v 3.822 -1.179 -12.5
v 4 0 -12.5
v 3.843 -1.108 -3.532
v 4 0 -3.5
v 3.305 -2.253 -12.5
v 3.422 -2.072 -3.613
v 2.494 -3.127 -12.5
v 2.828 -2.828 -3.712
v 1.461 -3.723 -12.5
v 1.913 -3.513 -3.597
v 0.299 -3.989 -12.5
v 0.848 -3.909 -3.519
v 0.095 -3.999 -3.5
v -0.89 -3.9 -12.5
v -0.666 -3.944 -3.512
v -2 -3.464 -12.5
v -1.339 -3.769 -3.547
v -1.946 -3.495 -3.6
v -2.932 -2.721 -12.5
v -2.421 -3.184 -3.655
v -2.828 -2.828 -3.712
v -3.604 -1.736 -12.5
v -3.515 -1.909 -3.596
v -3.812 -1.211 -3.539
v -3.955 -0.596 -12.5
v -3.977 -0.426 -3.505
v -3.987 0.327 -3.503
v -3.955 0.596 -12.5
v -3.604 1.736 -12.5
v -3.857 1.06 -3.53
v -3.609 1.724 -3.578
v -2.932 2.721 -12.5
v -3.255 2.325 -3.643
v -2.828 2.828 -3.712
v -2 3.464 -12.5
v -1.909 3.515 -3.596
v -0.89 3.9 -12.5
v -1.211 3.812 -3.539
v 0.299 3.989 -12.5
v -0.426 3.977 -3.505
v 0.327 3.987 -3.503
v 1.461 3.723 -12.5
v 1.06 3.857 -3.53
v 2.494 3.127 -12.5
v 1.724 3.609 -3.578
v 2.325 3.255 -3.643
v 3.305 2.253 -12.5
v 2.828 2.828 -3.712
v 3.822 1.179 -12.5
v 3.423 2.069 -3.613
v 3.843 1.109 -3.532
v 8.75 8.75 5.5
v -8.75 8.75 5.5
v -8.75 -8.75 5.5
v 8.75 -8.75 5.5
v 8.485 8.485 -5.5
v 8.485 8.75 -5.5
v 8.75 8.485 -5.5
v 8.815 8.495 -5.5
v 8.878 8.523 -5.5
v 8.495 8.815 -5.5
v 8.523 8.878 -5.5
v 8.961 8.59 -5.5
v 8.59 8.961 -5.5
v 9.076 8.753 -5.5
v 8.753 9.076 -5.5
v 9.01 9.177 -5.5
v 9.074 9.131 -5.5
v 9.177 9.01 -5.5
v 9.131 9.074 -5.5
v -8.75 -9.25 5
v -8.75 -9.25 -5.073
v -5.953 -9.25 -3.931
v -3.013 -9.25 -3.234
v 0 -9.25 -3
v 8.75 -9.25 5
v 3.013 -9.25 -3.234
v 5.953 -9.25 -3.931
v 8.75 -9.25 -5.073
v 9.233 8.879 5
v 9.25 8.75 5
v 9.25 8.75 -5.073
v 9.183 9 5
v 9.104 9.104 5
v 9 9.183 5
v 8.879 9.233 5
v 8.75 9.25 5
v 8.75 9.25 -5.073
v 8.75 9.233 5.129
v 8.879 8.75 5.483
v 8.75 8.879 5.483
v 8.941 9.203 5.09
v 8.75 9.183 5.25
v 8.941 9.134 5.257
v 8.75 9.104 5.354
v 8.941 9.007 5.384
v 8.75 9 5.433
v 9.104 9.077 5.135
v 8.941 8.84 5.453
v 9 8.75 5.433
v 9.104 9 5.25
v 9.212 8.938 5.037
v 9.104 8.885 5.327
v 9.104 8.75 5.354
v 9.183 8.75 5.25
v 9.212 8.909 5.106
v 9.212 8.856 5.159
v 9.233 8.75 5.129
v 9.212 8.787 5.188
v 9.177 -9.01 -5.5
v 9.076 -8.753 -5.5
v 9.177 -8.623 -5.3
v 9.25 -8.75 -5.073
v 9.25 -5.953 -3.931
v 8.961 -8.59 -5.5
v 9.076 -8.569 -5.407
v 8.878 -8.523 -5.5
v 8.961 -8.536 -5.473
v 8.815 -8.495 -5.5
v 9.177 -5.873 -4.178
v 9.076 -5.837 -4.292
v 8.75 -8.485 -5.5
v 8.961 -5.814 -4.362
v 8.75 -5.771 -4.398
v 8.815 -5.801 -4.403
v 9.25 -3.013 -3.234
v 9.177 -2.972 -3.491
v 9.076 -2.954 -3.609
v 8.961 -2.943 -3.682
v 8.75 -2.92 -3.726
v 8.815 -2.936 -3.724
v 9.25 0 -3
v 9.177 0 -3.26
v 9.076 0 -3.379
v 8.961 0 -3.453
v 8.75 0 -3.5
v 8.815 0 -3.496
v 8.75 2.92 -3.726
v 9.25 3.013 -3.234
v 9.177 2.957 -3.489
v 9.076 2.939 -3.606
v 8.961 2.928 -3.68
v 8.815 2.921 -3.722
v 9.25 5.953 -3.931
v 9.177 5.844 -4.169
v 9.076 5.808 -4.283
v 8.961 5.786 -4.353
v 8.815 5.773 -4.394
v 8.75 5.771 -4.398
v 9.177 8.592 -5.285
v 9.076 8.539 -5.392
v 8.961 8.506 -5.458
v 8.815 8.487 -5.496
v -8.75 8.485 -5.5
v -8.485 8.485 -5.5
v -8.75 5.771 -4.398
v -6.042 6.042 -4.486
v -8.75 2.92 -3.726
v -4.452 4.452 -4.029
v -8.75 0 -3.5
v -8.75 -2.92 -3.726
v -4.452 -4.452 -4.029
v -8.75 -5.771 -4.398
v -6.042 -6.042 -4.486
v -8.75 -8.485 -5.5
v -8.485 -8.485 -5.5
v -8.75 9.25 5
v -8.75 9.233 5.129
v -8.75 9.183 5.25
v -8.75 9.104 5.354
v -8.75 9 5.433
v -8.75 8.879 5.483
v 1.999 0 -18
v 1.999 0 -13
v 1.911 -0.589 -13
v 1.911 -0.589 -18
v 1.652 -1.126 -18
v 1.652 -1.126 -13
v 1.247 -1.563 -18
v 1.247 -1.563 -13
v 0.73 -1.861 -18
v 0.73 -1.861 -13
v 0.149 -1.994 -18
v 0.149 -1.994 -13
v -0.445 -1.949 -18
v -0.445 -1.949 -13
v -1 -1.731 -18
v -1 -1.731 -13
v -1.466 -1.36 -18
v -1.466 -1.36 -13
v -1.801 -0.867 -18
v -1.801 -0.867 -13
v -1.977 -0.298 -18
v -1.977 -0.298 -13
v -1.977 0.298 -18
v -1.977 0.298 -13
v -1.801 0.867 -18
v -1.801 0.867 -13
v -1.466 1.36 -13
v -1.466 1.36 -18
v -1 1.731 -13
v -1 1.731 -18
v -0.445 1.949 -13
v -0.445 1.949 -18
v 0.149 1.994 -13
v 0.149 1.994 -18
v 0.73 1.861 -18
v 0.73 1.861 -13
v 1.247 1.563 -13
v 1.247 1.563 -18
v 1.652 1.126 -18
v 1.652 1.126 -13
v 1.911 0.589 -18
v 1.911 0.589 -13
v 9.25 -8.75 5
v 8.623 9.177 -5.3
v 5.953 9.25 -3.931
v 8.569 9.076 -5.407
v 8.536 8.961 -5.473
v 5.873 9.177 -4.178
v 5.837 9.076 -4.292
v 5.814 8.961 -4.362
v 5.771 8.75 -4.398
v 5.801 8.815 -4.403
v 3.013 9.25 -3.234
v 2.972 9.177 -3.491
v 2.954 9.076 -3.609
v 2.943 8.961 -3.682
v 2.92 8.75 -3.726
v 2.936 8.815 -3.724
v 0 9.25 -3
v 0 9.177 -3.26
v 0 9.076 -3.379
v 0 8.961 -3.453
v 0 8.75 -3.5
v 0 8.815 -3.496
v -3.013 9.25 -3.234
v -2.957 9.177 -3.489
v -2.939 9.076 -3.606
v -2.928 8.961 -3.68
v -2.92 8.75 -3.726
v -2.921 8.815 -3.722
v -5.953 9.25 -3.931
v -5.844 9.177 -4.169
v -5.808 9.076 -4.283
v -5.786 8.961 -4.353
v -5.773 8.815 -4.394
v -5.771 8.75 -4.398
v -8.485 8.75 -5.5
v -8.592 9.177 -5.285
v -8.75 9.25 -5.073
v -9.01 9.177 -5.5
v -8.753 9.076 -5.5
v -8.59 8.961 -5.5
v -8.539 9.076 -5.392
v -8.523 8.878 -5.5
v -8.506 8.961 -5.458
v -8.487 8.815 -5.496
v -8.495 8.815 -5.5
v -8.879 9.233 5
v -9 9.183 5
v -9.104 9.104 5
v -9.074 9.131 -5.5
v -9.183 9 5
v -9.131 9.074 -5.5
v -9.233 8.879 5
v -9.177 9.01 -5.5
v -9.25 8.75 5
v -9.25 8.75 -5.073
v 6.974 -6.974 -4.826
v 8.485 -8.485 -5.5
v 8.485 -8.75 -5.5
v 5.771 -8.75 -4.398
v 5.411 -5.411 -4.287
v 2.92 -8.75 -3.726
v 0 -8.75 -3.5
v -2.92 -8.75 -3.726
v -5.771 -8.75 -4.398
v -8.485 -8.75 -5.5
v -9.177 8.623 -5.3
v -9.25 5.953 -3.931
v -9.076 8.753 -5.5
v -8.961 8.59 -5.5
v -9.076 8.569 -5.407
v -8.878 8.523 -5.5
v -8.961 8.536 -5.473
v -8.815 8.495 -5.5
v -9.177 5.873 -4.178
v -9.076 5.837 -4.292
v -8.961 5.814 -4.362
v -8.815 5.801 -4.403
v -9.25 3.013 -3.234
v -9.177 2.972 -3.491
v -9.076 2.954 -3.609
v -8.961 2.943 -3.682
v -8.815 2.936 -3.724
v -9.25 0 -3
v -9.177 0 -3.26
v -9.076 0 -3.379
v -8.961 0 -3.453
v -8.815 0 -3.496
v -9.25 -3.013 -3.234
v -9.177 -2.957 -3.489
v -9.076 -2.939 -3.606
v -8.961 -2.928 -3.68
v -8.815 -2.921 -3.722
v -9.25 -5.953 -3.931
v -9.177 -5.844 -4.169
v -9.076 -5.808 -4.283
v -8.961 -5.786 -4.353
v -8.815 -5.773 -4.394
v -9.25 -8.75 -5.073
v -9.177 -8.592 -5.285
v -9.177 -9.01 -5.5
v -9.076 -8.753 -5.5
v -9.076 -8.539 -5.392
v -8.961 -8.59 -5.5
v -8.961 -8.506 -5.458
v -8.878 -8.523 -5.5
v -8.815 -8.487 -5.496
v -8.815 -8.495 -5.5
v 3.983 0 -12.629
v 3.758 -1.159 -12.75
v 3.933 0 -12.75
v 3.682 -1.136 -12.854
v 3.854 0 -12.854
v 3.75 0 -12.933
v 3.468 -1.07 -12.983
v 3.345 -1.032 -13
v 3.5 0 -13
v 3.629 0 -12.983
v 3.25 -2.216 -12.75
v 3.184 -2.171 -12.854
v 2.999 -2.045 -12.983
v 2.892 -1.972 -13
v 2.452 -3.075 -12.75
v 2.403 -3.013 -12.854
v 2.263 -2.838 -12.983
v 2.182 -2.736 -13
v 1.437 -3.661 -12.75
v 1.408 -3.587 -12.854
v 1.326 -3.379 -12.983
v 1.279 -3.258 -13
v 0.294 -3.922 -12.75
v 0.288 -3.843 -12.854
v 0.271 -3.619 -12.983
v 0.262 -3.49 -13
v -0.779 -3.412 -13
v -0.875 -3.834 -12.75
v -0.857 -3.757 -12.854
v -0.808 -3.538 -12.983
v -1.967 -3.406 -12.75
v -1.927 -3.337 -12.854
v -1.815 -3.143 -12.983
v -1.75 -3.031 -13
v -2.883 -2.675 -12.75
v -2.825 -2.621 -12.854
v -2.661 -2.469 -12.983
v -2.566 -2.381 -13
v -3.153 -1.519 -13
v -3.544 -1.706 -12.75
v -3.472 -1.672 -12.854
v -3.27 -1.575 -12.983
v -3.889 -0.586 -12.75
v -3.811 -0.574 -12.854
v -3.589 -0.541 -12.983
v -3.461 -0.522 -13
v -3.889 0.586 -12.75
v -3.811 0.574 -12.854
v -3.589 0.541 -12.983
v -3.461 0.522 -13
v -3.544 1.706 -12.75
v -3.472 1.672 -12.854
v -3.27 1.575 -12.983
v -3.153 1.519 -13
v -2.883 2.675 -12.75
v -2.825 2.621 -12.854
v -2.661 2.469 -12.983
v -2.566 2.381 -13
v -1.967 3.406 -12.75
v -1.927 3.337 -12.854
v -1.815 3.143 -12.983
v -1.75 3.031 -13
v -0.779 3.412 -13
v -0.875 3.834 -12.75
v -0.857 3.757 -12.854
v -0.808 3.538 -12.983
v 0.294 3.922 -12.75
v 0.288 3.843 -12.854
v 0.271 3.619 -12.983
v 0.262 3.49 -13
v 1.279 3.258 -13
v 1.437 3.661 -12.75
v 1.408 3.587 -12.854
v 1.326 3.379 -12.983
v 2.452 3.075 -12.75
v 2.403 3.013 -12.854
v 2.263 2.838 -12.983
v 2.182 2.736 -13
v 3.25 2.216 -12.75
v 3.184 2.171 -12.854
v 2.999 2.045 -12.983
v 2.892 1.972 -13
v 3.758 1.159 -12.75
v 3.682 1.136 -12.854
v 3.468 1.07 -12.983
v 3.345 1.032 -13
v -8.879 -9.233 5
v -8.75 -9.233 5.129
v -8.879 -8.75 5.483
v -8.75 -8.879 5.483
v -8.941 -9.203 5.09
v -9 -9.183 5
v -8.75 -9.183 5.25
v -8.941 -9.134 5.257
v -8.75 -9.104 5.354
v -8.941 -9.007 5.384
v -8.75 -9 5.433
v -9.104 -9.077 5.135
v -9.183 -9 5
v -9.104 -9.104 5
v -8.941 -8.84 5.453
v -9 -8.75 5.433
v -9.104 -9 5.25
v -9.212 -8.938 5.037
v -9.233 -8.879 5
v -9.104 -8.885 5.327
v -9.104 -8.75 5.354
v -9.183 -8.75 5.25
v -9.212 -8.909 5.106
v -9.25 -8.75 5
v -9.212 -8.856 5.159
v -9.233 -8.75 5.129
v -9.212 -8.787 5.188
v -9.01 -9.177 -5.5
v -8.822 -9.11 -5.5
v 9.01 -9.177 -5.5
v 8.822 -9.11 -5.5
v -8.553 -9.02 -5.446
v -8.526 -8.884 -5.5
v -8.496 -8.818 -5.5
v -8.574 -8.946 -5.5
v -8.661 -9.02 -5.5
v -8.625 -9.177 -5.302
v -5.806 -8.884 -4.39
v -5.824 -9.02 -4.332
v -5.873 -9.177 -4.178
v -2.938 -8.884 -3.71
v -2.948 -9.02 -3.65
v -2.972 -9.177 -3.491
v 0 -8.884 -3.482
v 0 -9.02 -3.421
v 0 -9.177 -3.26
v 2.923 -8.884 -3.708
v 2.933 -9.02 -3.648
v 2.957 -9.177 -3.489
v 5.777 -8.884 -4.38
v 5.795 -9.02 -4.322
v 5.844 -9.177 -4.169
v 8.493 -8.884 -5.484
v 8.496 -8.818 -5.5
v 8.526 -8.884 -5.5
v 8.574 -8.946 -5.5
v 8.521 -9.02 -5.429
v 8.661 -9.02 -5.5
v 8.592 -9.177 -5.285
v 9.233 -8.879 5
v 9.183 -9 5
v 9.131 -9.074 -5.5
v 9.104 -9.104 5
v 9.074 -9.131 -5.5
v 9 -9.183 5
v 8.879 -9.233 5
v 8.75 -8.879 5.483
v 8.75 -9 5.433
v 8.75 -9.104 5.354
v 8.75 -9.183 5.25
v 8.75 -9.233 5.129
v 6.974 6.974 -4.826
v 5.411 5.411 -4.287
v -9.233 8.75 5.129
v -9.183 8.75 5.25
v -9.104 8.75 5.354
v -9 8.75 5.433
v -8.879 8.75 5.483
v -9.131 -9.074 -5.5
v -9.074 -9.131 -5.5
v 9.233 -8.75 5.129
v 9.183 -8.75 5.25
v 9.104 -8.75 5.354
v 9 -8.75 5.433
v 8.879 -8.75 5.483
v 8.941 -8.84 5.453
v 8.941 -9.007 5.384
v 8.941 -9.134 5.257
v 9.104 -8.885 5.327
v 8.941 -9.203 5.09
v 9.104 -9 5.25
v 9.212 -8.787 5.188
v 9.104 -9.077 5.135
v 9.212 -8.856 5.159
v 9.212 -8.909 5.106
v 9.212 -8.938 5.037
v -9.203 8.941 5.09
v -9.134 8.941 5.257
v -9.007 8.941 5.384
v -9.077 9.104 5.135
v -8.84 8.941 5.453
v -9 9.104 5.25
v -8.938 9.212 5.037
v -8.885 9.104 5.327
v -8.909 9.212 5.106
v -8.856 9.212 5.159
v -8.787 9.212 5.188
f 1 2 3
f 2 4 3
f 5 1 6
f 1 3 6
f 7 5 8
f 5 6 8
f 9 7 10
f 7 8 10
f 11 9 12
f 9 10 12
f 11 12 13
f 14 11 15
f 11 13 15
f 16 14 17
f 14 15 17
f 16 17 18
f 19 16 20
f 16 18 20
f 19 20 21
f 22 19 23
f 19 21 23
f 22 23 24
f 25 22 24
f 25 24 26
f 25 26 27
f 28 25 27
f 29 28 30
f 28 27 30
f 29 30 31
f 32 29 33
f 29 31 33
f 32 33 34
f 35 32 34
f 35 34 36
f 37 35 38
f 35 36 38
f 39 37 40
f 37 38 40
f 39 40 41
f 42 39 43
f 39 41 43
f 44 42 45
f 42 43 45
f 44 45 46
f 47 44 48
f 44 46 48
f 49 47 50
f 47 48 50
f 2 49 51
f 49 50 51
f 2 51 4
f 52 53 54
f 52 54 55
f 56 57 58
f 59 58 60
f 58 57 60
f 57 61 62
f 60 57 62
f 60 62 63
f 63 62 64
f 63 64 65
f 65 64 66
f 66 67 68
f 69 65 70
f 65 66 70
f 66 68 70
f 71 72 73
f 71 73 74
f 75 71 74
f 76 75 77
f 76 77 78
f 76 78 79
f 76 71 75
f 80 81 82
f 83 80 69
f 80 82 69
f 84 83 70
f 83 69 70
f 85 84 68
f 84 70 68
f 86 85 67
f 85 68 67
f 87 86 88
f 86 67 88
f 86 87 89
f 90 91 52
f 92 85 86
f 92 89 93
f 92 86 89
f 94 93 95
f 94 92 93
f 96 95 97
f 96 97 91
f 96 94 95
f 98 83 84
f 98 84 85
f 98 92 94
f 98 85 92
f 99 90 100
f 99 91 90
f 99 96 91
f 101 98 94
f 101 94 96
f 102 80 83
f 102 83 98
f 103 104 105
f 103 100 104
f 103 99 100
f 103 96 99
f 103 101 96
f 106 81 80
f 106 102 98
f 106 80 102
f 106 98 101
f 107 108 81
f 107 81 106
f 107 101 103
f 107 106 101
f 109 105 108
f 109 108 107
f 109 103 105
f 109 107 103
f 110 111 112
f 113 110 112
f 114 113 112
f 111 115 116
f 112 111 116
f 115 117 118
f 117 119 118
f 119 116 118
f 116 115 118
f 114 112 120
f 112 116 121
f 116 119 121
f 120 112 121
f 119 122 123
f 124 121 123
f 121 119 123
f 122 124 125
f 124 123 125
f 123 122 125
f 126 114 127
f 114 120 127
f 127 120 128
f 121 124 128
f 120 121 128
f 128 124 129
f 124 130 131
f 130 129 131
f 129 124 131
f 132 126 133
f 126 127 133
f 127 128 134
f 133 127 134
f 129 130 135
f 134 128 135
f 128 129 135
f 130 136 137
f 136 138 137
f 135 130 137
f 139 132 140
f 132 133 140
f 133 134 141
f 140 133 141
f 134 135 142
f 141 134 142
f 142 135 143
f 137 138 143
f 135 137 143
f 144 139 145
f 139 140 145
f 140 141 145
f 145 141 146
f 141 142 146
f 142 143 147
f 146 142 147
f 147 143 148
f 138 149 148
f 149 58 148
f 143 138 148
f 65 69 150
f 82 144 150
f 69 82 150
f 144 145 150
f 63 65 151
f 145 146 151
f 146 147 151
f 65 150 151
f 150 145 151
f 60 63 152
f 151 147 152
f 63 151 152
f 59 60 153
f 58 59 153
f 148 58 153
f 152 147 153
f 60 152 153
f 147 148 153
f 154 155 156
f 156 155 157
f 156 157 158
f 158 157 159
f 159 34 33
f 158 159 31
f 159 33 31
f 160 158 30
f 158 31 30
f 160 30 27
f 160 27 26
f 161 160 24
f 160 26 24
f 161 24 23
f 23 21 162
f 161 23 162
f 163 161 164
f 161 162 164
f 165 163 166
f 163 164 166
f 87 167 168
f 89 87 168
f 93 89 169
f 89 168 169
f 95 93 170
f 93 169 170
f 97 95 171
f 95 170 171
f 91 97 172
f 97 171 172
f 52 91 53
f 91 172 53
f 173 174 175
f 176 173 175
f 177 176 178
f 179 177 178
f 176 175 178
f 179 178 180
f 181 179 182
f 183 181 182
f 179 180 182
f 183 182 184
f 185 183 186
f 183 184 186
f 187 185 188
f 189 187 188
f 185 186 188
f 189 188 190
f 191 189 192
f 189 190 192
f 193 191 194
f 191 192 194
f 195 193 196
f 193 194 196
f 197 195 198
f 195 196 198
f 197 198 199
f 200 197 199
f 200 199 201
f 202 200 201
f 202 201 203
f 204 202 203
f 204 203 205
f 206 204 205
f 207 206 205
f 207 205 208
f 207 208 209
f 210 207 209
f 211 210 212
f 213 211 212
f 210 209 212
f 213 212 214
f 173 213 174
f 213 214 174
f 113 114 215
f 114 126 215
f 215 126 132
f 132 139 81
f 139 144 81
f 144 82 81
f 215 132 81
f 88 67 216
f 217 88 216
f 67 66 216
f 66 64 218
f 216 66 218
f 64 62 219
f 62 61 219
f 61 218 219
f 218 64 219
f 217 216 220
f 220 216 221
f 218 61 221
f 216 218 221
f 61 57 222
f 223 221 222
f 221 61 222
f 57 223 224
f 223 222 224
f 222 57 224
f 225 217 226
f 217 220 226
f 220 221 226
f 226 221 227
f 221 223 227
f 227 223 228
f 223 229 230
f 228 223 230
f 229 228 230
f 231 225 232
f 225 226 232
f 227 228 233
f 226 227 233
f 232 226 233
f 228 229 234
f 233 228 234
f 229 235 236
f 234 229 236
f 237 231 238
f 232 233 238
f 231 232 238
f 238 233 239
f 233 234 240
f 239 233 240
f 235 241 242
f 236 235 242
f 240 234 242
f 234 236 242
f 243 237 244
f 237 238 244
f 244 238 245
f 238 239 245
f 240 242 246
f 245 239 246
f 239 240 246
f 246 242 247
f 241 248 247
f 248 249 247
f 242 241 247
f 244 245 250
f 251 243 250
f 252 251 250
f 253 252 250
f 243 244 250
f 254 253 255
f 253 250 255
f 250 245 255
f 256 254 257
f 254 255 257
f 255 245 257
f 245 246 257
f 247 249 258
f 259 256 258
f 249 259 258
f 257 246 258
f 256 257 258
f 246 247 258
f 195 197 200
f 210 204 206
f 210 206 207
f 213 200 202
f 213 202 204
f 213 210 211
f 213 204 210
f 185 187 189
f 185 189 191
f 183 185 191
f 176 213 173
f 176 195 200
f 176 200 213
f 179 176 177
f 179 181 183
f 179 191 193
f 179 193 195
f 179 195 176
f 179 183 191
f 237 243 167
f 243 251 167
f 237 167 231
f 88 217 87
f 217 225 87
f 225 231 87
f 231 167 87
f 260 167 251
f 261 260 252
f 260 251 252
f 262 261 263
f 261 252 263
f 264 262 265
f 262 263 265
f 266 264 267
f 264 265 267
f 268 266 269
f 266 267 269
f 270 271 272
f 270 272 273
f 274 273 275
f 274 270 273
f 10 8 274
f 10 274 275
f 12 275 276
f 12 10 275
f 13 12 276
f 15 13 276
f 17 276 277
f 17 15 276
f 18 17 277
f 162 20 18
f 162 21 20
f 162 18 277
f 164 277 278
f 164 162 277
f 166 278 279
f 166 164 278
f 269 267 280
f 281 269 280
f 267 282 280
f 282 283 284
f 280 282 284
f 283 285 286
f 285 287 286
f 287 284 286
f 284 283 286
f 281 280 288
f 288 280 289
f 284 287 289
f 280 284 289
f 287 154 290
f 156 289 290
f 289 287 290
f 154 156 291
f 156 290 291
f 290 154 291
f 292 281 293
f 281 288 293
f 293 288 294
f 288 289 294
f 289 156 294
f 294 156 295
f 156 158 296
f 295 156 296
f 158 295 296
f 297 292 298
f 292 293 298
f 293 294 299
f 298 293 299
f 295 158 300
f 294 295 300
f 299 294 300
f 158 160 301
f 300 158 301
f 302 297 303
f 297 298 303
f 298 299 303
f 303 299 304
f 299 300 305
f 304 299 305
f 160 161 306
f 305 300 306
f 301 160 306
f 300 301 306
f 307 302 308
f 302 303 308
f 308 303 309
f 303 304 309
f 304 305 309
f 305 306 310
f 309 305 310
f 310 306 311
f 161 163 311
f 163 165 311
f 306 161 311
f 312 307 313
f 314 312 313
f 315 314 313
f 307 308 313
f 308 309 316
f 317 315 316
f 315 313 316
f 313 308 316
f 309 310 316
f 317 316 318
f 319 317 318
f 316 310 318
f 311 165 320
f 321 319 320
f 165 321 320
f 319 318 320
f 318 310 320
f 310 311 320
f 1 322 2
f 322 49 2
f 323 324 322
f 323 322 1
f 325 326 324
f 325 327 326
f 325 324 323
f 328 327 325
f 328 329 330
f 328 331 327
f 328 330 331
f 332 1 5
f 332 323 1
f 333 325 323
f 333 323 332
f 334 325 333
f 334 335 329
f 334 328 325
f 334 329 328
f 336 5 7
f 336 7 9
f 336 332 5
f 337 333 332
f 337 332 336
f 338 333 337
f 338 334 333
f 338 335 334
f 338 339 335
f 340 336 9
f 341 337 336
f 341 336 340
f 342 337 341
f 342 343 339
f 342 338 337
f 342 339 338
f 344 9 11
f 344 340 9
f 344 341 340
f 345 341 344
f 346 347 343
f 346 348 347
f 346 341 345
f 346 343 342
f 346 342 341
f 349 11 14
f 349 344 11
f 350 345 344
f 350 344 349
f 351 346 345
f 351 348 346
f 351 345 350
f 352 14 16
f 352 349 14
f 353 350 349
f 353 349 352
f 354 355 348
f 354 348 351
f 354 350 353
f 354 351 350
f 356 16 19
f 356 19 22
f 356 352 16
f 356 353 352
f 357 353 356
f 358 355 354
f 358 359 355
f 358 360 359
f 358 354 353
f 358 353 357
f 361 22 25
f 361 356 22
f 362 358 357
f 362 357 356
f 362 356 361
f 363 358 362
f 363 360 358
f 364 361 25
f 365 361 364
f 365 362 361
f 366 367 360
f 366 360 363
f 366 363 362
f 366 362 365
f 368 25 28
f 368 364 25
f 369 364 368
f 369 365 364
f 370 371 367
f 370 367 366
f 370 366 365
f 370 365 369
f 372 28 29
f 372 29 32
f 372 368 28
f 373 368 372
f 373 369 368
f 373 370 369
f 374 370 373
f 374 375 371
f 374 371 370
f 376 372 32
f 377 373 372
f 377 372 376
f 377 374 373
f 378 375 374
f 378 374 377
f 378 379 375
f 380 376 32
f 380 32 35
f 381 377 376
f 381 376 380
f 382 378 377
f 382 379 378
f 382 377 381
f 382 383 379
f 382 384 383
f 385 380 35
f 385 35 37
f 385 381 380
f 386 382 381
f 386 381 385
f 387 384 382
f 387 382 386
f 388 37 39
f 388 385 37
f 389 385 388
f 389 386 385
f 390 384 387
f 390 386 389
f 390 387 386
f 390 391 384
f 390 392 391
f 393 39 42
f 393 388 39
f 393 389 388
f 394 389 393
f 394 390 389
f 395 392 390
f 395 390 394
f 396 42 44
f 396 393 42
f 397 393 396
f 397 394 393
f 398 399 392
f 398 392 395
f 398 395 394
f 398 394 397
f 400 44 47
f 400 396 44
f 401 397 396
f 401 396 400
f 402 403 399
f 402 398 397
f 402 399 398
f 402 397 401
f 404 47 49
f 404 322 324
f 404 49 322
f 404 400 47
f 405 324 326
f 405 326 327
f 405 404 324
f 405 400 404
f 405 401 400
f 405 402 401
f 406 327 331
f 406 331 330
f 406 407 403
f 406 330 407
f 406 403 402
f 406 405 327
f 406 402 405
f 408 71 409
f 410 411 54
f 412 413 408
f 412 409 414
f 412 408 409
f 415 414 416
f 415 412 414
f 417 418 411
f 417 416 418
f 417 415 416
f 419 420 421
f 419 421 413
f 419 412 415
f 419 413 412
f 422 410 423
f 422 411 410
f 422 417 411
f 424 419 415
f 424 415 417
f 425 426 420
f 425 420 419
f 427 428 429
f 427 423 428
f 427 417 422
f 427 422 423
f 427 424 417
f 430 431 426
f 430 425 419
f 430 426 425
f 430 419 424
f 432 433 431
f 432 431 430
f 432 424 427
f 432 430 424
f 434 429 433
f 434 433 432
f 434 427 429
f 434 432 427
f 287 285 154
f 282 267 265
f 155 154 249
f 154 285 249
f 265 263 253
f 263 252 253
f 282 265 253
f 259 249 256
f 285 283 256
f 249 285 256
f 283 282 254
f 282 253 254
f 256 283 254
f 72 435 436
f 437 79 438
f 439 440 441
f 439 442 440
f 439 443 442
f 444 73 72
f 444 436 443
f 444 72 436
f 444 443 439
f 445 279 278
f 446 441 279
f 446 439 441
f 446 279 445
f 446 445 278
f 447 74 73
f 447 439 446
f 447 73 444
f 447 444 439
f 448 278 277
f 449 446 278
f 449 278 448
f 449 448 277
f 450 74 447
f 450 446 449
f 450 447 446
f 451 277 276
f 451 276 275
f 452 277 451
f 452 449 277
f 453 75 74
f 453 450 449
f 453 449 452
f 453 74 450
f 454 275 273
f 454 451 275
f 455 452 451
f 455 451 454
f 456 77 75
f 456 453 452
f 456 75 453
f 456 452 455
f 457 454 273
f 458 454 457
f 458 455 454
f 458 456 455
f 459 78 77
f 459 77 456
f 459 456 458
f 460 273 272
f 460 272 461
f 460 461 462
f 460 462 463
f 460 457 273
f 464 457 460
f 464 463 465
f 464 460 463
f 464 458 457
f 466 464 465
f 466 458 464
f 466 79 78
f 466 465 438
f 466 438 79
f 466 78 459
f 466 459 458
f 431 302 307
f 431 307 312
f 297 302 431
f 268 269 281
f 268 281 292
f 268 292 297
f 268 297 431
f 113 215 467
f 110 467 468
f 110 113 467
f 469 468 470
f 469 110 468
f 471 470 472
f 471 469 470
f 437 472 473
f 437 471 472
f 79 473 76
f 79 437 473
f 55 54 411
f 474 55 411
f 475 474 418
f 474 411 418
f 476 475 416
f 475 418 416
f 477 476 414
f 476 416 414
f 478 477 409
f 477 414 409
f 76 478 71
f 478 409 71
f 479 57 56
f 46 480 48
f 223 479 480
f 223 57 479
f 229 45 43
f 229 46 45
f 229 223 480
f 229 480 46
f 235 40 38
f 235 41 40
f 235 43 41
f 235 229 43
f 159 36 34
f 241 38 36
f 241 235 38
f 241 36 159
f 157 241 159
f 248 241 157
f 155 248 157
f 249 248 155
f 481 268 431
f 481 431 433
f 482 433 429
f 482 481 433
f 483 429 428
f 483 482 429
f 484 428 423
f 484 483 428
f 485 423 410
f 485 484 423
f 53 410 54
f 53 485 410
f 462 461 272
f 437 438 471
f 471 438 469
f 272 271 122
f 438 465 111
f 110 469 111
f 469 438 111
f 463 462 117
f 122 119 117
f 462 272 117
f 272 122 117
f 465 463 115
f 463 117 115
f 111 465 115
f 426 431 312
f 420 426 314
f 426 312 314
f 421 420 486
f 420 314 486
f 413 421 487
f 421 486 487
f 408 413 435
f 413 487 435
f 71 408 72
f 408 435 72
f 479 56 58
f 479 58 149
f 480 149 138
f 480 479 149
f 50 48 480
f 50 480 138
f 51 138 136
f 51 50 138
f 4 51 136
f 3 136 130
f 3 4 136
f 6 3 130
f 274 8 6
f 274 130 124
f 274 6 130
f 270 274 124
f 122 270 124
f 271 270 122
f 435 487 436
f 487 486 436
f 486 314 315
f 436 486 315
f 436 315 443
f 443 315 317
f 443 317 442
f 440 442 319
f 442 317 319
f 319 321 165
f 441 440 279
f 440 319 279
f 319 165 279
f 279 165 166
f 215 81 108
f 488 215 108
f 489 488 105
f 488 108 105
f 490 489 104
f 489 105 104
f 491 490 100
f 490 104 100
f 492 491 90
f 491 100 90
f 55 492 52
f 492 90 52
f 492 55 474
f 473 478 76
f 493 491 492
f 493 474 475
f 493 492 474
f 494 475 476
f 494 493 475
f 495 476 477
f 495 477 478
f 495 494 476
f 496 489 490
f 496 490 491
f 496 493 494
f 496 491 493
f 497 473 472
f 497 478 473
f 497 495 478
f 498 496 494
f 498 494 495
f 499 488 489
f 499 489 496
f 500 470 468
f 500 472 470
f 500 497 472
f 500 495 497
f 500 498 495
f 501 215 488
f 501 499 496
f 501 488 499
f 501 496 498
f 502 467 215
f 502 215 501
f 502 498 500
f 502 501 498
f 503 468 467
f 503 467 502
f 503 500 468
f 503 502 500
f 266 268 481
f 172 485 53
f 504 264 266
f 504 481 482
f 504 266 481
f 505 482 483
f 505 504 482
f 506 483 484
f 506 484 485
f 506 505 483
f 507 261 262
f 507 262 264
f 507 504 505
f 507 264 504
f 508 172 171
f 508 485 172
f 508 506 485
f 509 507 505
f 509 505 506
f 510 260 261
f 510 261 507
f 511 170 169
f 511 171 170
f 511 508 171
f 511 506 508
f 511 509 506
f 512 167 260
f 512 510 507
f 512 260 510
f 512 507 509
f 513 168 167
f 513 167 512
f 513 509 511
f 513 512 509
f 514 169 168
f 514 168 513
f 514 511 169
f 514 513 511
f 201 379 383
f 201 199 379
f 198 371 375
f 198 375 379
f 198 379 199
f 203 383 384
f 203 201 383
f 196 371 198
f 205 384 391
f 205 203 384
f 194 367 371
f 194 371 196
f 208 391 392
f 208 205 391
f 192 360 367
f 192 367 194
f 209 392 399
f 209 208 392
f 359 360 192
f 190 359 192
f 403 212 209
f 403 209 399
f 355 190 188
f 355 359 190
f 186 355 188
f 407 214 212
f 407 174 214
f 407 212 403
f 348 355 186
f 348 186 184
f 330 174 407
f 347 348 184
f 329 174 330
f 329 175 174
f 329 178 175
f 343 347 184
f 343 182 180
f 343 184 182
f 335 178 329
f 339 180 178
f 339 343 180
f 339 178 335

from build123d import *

# Parameters (mm, degrees)
F0_W          = 18.5
F0_H          = 11
F1_DEPTH      = 9.25
F2_DEPTH      = 9.25
F3_R          = 19
F5_DEPTH      = 25.4
F6_DEPTH      = 25.4
F4_R          = 19
F7_DEPTH      = 25.4
F8_DEPTH      = 25.4
F9_R          = 4
F10_DEPTH     = 3.45753
F11_DEPTH     = 7.5
F12_T1_DEPTH  = 11.75
F12_T3_DEPTH  = 17.5
F12_T5_DEPTH  = 17.5
F12_S9_W      = 0.5
F12_S9_H      = 0.5
F12_T10_DEPTH = 0.5
F12_S15_W     = 0.5
F12_S15_H     = 0.5
F12_T16_DEPTH = 0.5
F12_S21_W     = 0.5
F12_S21_H     = 0.5
F12_T22_DEPTH = 0.5
F12_S27_W     = 0.5
F12_S27_H     = 0.5
F12_T28_DEPTH = 0.5
F12_T34_ANGLE = 60.5906744424
F12_T36_ANGLE = 60.5906744424
F12_T38_ANGLE = 60.5906744424
F12_T40_ANGLE = 60.5906744424
F13_R         = 1.9993297739
F14_DEPTH     = 5


# Not quite as in the source:
# - a fillet or chamfer that OpenCascade refuses, or shapes differently, is made with other operations: its cross-section is extruded or revolved along the edge and cut away or added
# - a feature names something its author has since deleted; it is built from what else it names


with BuildPart() as f1:
    # F0 (on Front) → F1 (new body)
    with BuildSketch(Plane.XZ):
        Rectangle(F0_W, F0_H)
    extrude(amount=-F1_DEPTH)

    # F0 (on Front) → F2 (join)
    with BuildSketch(Plane.XZ):
        Rectangle(F0_W, F0_H)
    extrude(amount=F2_DEPTH)

    # F3 (on Front) → F5 (cut)
    with BuildSketch(Plane.XZ):
        with Locations((0, -22.5)):
            Circle(F3_R)
    extrude(amount=-F5_DEPTH, mode=Mode.SUBTRACT)

    # F3 (on Front) → F6 (cut)
    with BuildSketch(Plane.XZ):
        with Locations((0, -22.5)):
            Circle(F3_R)
    extrude(amount=F6_DEPTH, mode=Mode.SUBTRACT)

    # F4 (on Right) → F7 (cut)
    with BuildSketch(Plane.YZ):
        with Locations((0, -22.5)):
            Circle(F4_R)
    extrude(amount=-F7_DEPTH, mode=Mode.SUBTRACT)

    # F4 (on Right) → F8 (cut)
    with BuildSketch(Plane.YZ):
        with Locations((0, -22.5)):
            Circle(F4_R)
    extrude(amount=F8_DEPTH, mode=Mode.SUBTRACT)

    # F9 (on face) → F10 (join)
    with BuildSketch(Plane(origin=(0, 0, -5.5), x_dir=(1, 0, 0), z_dir=(0, 0, -1))):
        Circle(F9_R)
    extrude(amount=-F10_DEPTH)

    # F11 (add): a face of the model
    f11_faces = [f1.faces().sort_by_distance(p)[0] for p in [
        (0, 0, -5.5),
    ]]
    extrude(f11_faces, amount=F11_DEPTH)

    # F12: fillet of radius 0.5 on 13 edges, made by hand

    # F12_s2 → F12_t1 (cut)
    with BuildSketch(Plane.XY.offset(-6.75)):
        with BuildLine():
            ThreePointArc((9.25, -8.75), (9.1035533906, -9.1035533906), (8.75, -9.25))
            Line((8.75, -9.25), (9.25, -9.25))
            Line((9.25, -9.25), (9.25, -8.75))
        make_face()
        with BuildLine():
            ThreePointArc((-9.25, -8.75), (-9.1035533906, -9.1035533906), (-8.75, -9.25))
            Line((-8.75, -9.25), (-9.25, -9.25))
            Line((-9.25, -9.25), (-9.25, -8.75))
        make_face()
        with BuildLine():
            ThreePointArc((9.25, 8.75), (9.1035533906, 9.1035533906), (8.75, 9.25))
            Line((8.75, 9.25), (9.25, 9.25))
            Line((9.25, 9.25), (9.25, 8.75))
        make_face()
        with BuildLine():
            ThreePointArc((-8.75, 9.25), (-9.1035533906, 9.1035533906), (-9.25, 8.75))
            Line((-9.25, 8.75), (-9.25, 9.25))
            Line((-9.25, 9.25), (-8.75, 9.25))
        make_face()
    extrude(amount=F12_T1_DEPTH, mode=Mode.SUBTRACT)

    # F12_s4 → F12_t3 (cut)
    with BuildSketch(Plane.YZ.offset(-8.75)):
        with BuildLine():
            ThreePointArc((-8.75, 5.5), (-9.1035533906, 5.3535533906), (-9.25, 5))
            Line((-9.25, 5), (-9.25, 5.5))
            Line((-9.25, 5.5), (-8.75, 5.5))
        make_face()
        with BuildLine():
            ThreePointArc((9.25, 5), (9.1035533906, 5.3535533906), (8.75, 5.5))
            Line((8.75, 5.5), (9.25, 5.5))
            Line((9.25, 5.5), (9.25, 5))
        make_face()
    extrude(amount=F12_T3_DEPTH, mode=Mode.SUBTRACT)

    # F12_s6 → F12_t5 (cut)
    with BuildSketch(Plane.XZ.offset(-8.75)):
        with BuildLine():
            ThreePointArc((9.25, 5), (9.1035533906, 5.3535533906), (8.75, 5.5))
            Line((8.75, 5.5), (9.25, 5.5))
            Line((9.25, 5.5), (9.25, 5))
        make_face()
        with BuildLine():
            ThreePointArc((-9.25, 5), (-9.1035533906, 5.3535533906), (-8.75, 5.5))
            Line((-8.75, 5.5), (-9.25, 5.5))
            Line((-9.25, 5.5), (-9.25, 5))
        make_face()
    extrude(amount=F12_T5_DEPTH, mode=Mode.SUBTRACT)


with BuildPart() as f12_tool8:
    # F12_s9 → F12_t10 (new body)
    with BuildSketch(Plane.YZ.offset(8.75)):
        with Locations((-9, 5.25)):
            Rectangle(F12_S9_W, F12_S9_H)
    extrude(amount=F12_T10_DEPTH)

    # F12_s11 → F12_t12 (revolve, cut)
    with BuildSketch(Plane(origin=(8.75, -8.75, 5), x_dir=(0, 0.7071067812, -0.7071067812), z_dir=(0, -0.7071067812, -0.7071067812))):
        with BuildLine():
            ThreePointArc((0, -0.5), (0.5, 0), (0, 0.5))
            Line((0, 0.5), (0, -0.5))
        make_face()
    revolve(axis=Axis((8.75, -8.75, 5), (1, 0, 0)), mode=Mode.SUBTRACT)


with BuildPart() as f1_1:
    add(f1.part)

    # F12_t7: cut F12_tool8
    add(f12_tool8.part, mode=Mode.SUBTRACT)


with BuildPart() as f12_tool14:
    # F12_s15 → F12_t16 (new body)
    with BuildSketch(Plane.YZ.offset(-8.75)):
        with Locations((-9, 5.25)):
            Rectangle(F12_S15_W, F12_S15_H)
    extrude(amount=-F12_T16_DEPTH)

    # F12_s17 → F12_t18 (revolve, cut)
    with BuildSketch(Plane(origin=(-8.75, -8.75, 5), x_dir=(0, 0.7071067812, -0.7071067812), z_dir=(0, 0.7071067812, 0.7071067812))):
        with BuildLine():
            ThreePointArc((0, -0.5), (0.5, 0), (0, 0.5))
            Line((0, 0.5), (0, -0.5))
        make_face()
    revolve(axis=Axis((-8.75, -8.75, 5), (-1, 0, 0)), mode=Mode.SUBTRACT)


with BuildPart() as f1_2:
    add(f1_1.part)

    # F12_t13: cut F12_tool14
    add(f12_tool14.part, mode=Mode.SUBTRACT)


with BuildPart() as f12_tool20:
    # F12_s21 → F12_t22 (new body)
    with BuildSketch(Plane.YZ.offset(8.75)):
        with Locations((9, 5.25)):
            Rectangle(F12_S21_W, F12_S21_H)
    extrude(amount=F12_T22_DEPTH)

    # F12_s23 → F12_t24 (revolve, cut)
    with BuildSketch(Plane(origin=(8.75, 8.75, 5), x_dir=(0, -0.7071067812, -0.7071067812), z_dir=(0, -0.7071067812, 0.7071067812))):
        with BuildLine():
            ThreePointArc((0, -0.5), (0.5, 0), (0, 0.5))
            Line((0, 0.5), (0, -0.5))
        make_face()
    revolve(axis=Axis((8.75, 8.75, 5), (1, 0, 0)), mode=Mode.SUBTRACT)


with BuildPart() as f1_3:
    add(f1_2.part)

    # F12_t19: cut F12_tool20
    add(f12_tool20.part, mode=Mode.SUBTRACT)


with BuildPart() as f12_tool26:
    # F12_s27 → F12_t28 (new body)
    with BuildSketch(Plane.XZ.offset(-8.75)):
        with Locations((-9, 5.25)):
            Rectangle(F12_S27_W, F12_S27_H)
    extrude(amount=-F12_T28_DEPTH)

    # F12_s29 → F12_t30 (revolve, cut)
    with BuildSketch(Plane(origin=(-8.75, 8.75, 5), x_dir=(0.7071067812, 0, -0.7071067812), z_dir=(0.7071067812, 0, 0.7071067812))):
        with BuildLine():
            ThreePointArc((0, -0.5), (0.5, 0), (0, 0.5))
            Line((0, 0.5), (0, -0.5))
        make_face()
    revolve(axis=Axis((-8.75, 8.75, 5), (0, 1, 0)), mode=Mode.SUBTRACT)


with BuildPart() as f1_4:
    add(f1_3.part)

    # F12_t25: cut F12_tool26
    add(f12_tool26.part, mode=Mode.SUBTRACT)

    # F12_s31 → F12_t32 (revolve, cut)
    with BuildSketch(Plane.XZ):
        with BuildLine():
            ThreePointArc((4, -12.5), (3.8535533906, -12.8535533906), (3.5, -13))
            Line((3.5, -13), (4, -13))
            Line((4, -13), (4, -12.5))
        make_face()
    revolve(axis=Axis((0, 0, -13), (0, 0, -1)), mode=Mode.SUBTRACT)

    # F12_s33 → F12_t34 (revolve, cut)
    with BuildSketch(Plane(origin=(-9.8002563667, 0, -5.7257375924), x_dir=(0, 1, 0), z_dir=(-0.8634366066, 0, -0.5044573583))):
        with BuildLine():
            ThreePointArc((-8.75, 0.4273236492), (-9.1035533906, 0.2808770398), (-9.25, -0.0726763508))
            Line((-9.25, -0.0726763508), (-9.25, 0.4273236492))
            Line((-9.25, 0.4273236492), (-8.75, 0.4273236492))
        make_face()
    revolve(axis=Axis((0, -9.25, -22.5), (0, 1, 0)), revolution_arc=F12_T34_ANGLE, mode=Mode.SUBTRACT)

    # F12_s35 → F12_t36 (revolve, cut)
    with BuildSketch(Plane(origin=(0, 9.8002563667, -5.7257375924), x_dir=(1, 0, 0), z_dir=(0, 0.8634366066, -0.5044573583))):
        with BuildLine():
            ThreePointArc((-9.25, -0.0726763508), (-9.1035533906, 0.2808770398), (-8.75, 0.4273236492))
            Line((-8.75, 0.4273236492), (-9.25, 0.4273236492))
            Line((-9.25, 0.4273236492), (-9.25, -0.0726763508))
        make_face()
    revolve(axis=Axis((-9.25, 0, -22.5), (1, 0, 0)), revolution_arc=F12_T36_ANGLE, mode=Mode.SUBTRACT)

    # F12_s37 → F12_t38 (revolve, cut)
    with BuildSketch(Plane(origin=(0, -9.8002563667, -5.7257375924), x_dir=(1, 0, 0), z_dir=(0, -0.8634366066, -0.5044573583))):
        with BuildLine():
            ThreePointArc((9.25, 0.0726763508), (9.1035533906, -0.2808770398), (8.75, -0.4273236492))
            Line((8.75, -0.4273236492), (9.25, -0.4273236492))
            Line((9.25, -0.4273236492), (9.25, 0.0726763508))
        make_face()
    revolve(axis=Axis((9.25, 0, -22.5), (-1, 0, 0)), revolution_arc=F12_T38_ANGLE, mode=Mode.SUBTRACT)

    # F12_s39 → F12_t40 (revolve, cut)
    with BuildSketch(Plane(origin=(9.8002563667, 0, -5.7257375924), x_dir=(0, 1, 0), z_dir=(0.8634366066, 0, -0.5044573583))):
        with BuildLine():
            ThreePointArc((9.25, 0.0726763508), (9.1035533906, -0.2808770398), (8.75, -0.4273236492))
            Line((8.75, -0.4273236492), (9.25, -0.4273236492))
            Line((9.25, -0.4273236492), (9.25, 0.0726763508))
        make_face()
    revolve(axis=Axis((0, 9.25, -22.5), (0, -1, 0)), revolution_arc=F12_T40_ANGLE, mode=Mode.SUBTRACT)

    # F13 (on face) → F14 (join)
    with BuildSketch(Plane(origin=(0, 0, -13), x_dir=(1, 0, 0), z_dir=(0, 0, -1))):
        Circle(F13_R)
    extrude(amount=F14_DEPTH)


solid = f1_4.part
